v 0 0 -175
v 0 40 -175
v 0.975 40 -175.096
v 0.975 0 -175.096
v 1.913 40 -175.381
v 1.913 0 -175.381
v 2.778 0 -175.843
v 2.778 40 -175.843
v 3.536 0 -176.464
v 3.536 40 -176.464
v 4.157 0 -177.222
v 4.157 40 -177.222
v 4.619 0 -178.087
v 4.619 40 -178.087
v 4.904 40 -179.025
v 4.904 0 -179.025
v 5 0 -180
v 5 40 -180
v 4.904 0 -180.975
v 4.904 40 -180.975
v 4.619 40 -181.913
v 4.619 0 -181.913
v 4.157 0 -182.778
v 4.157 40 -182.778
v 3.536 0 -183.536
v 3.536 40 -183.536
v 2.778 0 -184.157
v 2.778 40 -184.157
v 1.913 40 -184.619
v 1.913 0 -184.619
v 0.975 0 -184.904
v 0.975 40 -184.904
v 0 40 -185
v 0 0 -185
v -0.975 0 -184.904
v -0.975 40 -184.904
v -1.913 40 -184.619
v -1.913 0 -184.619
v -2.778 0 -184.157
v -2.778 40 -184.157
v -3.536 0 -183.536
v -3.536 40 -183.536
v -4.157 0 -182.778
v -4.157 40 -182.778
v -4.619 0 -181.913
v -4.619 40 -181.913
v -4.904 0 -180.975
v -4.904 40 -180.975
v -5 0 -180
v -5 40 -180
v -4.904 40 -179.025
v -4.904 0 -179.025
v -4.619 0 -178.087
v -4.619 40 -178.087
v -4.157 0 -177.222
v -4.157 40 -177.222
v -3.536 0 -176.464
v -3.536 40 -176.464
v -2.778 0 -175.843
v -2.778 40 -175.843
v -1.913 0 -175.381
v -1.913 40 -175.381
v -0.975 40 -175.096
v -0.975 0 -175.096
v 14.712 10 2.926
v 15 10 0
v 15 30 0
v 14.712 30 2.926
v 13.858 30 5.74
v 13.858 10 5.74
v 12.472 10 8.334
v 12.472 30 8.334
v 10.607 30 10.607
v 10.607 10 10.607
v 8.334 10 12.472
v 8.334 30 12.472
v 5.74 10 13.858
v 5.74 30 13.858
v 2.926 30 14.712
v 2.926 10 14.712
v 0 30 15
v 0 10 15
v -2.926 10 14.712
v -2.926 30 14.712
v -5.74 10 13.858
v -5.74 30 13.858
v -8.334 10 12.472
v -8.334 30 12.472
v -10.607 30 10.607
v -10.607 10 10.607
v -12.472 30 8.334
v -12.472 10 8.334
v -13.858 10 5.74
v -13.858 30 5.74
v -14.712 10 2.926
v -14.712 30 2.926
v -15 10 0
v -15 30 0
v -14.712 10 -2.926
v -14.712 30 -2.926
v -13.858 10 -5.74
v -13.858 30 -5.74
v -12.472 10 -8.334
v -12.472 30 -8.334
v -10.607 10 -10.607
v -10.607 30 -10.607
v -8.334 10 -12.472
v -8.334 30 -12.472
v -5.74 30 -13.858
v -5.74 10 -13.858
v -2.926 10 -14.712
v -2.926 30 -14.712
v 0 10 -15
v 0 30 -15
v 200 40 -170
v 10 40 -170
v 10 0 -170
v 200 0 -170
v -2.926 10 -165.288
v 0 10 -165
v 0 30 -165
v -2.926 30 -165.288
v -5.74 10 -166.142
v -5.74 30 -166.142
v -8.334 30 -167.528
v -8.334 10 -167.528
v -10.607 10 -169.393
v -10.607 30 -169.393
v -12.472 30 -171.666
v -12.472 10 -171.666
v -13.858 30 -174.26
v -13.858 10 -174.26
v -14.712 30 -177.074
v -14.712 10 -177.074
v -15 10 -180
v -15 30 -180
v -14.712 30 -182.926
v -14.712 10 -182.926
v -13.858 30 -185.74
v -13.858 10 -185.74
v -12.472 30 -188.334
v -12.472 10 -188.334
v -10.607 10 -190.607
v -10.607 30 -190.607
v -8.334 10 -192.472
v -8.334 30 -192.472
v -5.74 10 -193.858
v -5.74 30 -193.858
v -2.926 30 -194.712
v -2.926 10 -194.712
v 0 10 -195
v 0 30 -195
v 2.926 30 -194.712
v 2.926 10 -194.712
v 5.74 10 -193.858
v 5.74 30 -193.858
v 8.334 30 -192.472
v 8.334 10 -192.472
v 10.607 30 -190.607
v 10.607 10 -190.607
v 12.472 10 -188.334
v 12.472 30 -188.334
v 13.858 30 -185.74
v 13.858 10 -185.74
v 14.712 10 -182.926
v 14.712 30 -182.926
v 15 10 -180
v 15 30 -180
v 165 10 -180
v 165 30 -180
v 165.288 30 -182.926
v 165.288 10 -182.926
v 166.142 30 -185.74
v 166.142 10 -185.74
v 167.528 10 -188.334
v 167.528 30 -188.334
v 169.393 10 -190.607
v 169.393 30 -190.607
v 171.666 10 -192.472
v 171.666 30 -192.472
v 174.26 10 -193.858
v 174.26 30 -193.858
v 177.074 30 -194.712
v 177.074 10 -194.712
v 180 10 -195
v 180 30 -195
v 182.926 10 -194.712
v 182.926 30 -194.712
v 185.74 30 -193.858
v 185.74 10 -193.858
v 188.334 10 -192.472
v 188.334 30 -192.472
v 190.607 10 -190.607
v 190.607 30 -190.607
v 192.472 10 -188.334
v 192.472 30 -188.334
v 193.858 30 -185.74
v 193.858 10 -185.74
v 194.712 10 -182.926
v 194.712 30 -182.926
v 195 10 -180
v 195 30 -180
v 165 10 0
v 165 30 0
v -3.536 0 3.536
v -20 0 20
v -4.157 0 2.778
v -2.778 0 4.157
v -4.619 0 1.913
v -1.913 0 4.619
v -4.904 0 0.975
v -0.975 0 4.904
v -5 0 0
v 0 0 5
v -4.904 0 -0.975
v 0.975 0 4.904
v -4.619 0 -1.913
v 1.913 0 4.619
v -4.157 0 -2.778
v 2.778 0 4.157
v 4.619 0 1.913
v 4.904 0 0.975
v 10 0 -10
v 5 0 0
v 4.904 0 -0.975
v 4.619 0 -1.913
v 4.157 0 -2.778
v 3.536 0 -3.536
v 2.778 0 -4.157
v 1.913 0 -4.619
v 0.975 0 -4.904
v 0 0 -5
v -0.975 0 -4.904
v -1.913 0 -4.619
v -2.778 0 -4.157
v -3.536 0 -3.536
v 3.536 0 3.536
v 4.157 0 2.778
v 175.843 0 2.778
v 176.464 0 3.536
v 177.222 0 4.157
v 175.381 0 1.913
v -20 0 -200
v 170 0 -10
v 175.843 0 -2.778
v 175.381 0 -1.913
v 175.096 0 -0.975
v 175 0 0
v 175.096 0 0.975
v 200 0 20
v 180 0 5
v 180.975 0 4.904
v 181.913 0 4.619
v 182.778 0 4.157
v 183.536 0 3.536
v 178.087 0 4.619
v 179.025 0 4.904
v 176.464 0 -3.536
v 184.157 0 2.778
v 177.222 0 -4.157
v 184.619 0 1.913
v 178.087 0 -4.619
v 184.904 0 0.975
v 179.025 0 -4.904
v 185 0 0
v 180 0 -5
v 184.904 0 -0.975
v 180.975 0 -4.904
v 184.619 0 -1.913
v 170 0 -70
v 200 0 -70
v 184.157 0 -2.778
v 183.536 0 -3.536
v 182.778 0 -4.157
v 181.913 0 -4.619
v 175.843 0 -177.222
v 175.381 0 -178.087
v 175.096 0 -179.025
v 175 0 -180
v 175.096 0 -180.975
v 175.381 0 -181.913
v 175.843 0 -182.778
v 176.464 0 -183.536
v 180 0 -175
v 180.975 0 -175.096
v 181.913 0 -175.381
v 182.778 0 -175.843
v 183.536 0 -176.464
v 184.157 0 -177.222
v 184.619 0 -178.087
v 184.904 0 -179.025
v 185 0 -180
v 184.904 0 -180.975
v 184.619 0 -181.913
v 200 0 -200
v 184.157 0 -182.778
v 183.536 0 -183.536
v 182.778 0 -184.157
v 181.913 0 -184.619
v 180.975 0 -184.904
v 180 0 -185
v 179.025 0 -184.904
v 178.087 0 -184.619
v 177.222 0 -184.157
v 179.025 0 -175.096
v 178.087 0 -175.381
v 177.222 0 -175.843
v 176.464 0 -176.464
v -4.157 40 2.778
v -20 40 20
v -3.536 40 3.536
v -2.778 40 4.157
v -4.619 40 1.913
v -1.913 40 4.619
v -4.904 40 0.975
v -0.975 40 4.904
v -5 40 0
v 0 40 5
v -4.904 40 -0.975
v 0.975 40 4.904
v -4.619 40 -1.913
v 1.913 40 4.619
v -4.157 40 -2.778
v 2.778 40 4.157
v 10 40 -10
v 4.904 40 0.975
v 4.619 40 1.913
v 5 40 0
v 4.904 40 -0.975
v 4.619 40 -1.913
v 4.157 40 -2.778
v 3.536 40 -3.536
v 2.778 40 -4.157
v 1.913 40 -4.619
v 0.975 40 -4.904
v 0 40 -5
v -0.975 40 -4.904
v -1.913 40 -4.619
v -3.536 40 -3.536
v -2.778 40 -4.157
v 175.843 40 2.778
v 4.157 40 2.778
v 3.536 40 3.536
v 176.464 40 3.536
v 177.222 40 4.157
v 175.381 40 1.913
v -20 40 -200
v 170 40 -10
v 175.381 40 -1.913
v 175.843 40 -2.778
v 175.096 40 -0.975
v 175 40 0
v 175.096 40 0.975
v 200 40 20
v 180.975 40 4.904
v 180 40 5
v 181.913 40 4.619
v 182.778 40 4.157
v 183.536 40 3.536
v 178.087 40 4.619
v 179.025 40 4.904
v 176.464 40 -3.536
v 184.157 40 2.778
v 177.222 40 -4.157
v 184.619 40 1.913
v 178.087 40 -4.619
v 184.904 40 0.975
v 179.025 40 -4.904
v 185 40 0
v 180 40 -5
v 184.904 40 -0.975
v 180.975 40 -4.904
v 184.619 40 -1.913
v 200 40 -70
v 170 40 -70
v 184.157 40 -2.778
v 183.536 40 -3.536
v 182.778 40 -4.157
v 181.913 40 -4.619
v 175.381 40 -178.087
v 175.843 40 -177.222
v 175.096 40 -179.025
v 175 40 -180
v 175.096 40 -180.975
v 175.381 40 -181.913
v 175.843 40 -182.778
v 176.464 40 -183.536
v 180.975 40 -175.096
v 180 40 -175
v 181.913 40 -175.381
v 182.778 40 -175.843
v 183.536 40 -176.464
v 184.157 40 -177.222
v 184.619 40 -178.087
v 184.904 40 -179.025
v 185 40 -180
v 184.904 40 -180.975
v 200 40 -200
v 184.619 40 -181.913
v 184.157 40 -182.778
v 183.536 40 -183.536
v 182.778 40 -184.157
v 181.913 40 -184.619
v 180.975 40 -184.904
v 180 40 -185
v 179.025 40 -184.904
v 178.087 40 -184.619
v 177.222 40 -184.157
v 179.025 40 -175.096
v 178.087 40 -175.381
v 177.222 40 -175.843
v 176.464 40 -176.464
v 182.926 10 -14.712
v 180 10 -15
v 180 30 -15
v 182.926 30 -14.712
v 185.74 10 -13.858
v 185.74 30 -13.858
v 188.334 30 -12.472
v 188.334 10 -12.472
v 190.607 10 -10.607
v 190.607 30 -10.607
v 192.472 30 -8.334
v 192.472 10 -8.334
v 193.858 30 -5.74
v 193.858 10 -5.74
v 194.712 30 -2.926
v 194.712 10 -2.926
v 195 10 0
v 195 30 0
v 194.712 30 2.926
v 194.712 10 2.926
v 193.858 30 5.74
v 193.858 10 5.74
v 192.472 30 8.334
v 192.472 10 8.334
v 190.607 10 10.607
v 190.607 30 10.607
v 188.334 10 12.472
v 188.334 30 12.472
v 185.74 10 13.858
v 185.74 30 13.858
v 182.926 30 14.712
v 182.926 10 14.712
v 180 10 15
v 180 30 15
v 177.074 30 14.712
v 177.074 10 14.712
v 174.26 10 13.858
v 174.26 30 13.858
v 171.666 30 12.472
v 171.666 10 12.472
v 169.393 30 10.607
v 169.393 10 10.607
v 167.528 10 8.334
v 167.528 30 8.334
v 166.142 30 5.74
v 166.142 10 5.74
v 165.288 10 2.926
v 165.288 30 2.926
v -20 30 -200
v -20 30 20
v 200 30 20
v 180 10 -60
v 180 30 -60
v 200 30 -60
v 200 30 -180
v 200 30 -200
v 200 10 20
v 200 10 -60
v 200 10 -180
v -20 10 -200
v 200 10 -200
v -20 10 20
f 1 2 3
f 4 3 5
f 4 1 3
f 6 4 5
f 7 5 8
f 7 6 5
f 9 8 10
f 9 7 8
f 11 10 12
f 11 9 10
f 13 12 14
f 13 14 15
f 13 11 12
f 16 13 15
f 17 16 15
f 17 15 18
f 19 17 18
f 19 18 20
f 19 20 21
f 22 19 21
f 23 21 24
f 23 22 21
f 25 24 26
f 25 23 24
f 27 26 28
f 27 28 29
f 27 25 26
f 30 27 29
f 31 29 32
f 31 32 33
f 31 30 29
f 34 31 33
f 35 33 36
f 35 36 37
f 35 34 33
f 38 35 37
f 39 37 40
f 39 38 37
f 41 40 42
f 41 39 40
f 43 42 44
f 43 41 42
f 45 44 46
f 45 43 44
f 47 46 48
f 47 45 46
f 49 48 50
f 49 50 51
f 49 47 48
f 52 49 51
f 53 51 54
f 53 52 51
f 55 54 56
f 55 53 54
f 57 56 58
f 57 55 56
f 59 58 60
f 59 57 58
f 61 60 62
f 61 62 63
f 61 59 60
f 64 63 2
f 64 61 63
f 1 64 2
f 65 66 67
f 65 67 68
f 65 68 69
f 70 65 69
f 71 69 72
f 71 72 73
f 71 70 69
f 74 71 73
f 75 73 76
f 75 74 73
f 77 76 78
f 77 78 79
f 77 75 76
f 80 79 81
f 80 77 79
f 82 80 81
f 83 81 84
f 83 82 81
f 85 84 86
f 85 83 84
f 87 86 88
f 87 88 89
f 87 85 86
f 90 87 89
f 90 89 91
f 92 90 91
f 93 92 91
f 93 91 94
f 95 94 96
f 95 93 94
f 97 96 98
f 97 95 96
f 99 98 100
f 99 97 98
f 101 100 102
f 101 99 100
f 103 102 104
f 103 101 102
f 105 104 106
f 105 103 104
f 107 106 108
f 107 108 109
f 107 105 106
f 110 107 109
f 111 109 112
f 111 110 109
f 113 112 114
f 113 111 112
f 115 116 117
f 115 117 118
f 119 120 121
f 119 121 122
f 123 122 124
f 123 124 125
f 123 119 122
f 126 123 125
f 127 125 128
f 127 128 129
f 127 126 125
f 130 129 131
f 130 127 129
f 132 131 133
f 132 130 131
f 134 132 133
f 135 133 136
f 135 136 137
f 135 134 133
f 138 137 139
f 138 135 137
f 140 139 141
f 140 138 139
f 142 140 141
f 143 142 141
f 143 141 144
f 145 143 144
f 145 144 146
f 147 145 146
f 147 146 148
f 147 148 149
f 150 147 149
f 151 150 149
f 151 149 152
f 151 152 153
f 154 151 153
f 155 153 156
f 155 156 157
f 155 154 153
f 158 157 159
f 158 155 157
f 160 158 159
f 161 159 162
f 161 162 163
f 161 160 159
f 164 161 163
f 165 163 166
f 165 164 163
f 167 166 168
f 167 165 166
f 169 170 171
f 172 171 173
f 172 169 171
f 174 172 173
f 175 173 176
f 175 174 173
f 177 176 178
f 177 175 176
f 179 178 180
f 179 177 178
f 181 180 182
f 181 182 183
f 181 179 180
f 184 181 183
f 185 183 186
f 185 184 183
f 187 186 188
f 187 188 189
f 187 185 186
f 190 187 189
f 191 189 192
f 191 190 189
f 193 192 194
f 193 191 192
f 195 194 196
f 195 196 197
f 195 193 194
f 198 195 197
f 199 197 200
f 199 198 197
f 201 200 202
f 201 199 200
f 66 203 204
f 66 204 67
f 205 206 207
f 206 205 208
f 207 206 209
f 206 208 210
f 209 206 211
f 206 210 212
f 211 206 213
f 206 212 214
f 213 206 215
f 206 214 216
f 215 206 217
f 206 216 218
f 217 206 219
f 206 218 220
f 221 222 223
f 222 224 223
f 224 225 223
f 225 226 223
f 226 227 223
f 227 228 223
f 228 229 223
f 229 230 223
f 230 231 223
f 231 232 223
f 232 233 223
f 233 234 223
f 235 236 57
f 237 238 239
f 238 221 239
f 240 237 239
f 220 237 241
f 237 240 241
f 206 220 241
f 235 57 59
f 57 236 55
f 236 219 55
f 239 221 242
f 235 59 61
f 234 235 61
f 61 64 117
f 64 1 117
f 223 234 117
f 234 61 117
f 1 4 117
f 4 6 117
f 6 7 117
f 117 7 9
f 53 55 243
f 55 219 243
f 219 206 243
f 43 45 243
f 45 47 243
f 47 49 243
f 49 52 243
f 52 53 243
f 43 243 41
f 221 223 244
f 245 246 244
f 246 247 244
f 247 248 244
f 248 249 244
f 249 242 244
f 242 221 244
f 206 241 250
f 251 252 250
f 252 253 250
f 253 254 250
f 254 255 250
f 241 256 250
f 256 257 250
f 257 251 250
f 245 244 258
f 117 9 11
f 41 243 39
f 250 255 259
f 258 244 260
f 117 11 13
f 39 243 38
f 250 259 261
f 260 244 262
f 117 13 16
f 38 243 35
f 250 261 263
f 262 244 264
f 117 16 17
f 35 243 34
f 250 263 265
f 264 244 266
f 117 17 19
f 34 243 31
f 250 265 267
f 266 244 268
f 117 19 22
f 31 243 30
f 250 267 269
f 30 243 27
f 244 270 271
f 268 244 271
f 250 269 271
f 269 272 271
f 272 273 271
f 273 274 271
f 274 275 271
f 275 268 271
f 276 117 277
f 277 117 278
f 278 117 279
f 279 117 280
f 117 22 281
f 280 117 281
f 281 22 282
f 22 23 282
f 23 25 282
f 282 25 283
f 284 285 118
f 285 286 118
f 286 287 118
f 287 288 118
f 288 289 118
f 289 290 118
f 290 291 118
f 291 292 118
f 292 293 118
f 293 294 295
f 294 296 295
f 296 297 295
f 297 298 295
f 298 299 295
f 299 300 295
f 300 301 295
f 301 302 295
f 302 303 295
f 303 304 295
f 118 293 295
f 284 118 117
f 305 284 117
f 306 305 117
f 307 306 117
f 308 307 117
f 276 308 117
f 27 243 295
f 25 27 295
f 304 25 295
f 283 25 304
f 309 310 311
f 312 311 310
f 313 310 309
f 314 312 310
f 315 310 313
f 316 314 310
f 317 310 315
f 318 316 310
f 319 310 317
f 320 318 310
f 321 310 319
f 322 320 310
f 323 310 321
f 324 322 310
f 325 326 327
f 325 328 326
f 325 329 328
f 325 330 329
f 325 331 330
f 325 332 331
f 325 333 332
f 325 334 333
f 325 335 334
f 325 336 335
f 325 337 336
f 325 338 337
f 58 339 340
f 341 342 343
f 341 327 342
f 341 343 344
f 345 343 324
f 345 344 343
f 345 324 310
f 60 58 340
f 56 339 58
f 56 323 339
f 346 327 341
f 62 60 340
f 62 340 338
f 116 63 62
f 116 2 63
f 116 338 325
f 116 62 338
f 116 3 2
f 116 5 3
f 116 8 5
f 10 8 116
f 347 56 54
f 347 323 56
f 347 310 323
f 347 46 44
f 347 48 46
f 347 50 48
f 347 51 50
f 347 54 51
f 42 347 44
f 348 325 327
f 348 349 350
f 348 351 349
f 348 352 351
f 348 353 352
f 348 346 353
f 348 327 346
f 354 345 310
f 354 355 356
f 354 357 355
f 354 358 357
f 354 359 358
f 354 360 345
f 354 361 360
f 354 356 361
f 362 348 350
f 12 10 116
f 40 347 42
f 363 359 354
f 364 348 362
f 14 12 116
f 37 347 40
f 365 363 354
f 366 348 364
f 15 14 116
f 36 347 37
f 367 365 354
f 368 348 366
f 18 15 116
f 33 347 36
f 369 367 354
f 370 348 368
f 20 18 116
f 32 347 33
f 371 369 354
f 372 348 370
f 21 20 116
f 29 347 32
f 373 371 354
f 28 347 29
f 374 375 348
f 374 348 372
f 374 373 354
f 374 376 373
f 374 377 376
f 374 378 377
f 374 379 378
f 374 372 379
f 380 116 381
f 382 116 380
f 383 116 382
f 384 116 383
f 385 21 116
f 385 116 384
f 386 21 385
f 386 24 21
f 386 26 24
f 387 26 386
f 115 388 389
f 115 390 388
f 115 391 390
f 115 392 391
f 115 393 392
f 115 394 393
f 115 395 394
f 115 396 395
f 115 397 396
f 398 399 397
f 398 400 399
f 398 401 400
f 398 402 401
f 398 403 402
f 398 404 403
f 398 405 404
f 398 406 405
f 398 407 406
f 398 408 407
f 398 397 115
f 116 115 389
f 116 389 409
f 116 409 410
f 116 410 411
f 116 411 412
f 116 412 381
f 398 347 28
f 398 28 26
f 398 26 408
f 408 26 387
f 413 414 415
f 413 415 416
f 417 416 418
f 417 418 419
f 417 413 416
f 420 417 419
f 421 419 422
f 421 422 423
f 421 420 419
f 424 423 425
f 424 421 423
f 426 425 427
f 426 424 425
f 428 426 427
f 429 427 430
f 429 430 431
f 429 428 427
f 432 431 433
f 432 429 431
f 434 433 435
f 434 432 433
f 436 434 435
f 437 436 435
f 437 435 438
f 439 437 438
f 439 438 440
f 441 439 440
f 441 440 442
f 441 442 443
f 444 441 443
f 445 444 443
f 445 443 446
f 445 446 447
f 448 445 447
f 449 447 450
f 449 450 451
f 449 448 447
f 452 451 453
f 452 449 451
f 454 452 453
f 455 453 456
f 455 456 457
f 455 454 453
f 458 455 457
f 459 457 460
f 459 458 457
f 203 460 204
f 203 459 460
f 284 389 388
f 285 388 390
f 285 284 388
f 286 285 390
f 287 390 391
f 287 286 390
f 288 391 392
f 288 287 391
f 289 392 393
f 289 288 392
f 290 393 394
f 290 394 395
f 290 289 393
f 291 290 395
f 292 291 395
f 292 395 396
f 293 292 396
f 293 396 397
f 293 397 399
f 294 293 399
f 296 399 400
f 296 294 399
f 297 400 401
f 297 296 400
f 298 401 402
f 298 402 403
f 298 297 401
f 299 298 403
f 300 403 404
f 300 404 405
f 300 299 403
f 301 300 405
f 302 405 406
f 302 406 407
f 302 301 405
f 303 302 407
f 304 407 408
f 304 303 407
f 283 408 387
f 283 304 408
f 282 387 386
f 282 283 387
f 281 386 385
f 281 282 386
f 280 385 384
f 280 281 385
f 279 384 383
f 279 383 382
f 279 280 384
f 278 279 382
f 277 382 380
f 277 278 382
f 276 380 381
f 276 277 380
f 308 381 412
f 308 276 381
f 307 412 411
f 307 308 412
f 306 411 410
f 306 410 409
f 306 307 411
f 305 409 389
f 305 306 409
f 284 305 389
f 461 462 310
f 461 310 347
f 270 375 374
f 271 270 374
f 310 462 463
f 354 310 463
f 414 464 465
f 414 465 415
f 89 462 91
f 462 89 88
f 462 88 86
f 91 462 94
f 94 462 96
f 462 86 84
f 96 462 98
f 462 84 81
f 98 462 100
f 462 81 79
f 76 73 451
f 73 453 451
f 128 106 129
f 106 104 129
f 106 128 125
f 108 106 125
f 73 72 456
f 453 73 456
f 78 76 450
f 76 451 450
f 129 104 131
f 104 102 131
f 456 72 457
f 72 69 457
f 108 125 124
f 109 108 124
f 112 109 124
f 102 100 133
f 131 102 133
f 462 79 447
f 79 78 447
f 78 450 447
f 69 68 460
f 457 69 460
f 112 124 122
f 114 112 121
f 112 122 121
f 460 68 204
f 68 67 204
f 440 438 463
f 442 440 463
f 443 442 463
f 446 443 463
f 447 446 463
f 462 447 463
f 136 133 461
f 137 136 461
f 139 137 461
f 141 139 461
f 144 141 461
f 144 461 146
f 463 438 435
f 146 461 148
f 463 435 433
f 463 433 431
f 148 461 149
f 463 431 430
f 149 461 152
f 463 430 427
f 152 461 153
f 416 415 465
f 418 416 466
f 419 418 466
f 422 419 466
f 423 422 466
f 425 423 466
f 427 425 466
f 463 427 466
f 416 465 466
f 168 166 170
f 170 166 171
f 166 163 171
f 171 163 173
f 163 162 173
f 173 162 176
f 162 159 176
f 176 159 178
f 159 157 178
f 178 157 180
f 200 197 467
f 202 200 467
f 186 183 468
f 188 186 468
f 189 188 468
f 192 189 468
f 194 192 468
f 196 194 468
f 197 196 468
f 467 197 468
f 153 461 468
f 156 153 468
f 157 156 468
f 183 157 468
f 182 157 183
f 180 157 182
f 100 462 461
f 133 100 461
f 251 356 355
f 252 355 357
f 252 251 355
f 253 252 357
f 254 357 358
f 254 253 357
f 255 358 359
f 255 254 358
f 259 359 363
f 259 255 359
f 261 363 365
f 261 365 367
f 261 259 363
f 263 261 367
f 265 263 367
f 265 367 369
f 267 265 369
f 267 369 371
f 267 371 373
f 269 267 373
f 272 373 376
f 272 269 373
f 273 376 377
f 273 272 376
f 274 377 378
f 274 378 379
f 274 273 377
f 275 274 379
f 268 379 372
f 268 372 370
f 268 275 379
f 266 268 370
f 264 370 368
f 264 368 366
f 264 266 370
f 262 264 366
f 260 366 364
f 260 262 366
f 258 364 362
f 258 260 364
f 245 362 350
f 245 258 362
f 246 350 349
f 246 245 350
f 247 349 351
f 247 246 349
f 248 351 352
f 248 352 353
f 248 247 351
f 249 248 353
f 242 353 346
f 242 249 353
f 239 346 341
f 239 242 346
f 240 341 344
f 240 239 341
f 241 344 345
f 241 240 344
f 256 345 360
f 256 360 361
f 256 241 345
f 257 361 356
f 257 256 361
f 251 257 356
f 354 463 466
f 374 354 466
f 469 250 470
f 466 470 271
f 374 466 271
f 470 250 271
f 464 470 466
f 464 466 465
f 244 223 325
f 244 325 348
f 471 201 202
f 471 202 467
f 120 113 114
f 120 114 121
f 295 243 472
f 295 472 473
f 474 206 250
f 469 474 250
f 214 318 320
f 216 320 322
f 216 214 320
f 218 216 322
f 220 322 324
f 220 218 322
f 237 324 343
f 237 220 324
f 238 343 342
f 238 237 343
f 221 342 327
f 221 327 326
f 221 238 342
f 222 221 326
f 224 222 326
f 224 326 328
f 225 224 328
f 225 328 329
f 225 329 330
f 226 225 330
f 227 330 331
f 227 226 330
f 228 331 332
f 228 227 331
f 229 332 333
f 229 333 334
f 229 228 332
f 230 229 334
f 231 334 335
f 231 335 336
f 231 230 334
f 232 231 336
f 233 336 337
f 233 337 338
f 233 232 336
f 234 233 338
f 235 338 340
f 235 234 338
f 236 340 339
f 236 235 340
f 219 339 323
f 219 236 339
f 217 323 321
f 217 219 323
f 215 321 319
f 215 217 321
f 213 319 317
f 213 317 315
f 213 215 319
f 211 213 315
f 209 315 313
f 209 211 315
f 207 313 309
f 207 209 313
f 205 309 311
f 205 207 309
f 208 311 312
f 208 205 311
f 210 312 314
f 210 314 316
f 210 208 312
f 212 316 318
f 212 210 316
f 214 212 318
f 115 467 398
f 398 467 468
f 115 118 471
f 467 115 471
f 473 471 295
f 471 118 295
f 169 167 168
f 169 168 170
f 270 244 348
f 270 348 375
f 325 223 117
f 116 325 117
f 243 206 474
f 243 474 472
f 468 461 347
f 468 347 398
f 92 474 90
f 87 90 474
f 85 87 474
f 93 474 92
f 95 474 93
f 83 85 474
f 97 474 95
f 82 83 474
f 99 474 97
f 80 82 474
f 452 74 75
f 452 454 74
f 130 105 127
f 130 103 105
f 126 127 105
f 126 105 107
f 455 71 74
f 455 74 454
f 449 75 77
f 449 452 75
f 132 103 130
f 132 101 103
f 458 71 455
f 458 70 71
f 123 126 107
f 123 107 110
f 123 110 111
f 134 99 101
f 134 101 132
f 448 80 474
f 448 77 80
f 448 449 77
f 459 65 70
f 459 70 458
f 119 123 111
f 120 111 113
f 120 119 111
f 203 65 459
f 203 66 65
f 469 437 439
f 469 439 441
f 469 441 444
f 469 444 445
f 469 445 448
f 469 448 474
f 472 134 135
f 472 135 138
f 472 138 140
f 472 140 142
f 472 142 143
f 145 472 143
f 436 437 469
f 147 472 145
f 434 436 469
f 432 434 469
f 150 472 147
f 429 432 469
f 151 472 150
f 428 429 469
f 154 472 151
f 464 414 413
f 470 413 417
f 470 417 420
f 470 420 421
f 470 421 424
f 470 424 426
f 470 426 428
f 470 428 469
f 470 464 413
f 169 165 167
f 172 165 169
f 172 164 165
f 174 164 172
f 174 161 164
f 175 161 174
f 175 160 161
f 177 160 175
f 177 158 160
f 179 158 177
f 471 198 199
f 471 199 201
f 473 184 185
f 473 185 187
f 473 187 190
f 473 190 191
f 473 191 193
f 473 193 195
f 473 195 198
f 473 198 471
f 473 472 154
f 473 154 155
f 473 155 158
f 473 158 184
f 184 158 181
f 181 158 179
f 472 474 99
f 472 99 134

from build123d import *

# Parameters (mm, degrees)
SKETCH1_W           = 220
SKETCH1_H           = 220
SKETCH1_R           = 5
SKETCH1_W_2         = 160
SKETCH1_H_2         = 160
BOSS_EXTRUDE1_DEPTH = 40
SKETCH4_W           = 30
SKETCH4_H           = 100
CUT_EXTRUDE1_DEPTH  = 286.657137142
SHELL1_START        = 10
SHELL1_DEPTH        = 20


# Read off the part's stored shape, not the designer's step: Shell1
with BuildPart() as part:
    # Sketch1 → Boss-Extrude1 (new body)
    with BuildSketch(Plane(origin=(0, 0, 0), x_dir=(1, 0, 0), z_dir=(0, 1, 0))):
        with Locations((90, 90)):
            Rectangle(SKETCH1_W, SKETCH1_H)
        with Locations(Location((0, 180, 0), (0, 0, 270))):
            Circle(SKETCH1_R, mode=Mode.SUBTRACT)
        with Locations(Location((180, 180, 0), (0, 0, 270))):
            Circle(SKETCH1_R, mode=Mode.SUBTRACT)
        with Locations(Location((180, 0, 0), (0, 0, 270))):
            Circle(SKETCH1_R, mode=Mode.SUBTRACT)
        with Locations(Location((0, 0, 0), (0, 0, 270))):
            Circle(SKETCH1_R, mode=Mode.SUBTRACT)
        with Locations((90, 90)):
            Rectangle(SKETCH1_W_2, SKETCH1_H_2, mode=Mode.SUBTRACT)
    extrude(amount=BOSS_EXTRUDE1_DEPTH)

    # Sketch4 → Cut-Extrude1 (cut, through all)
    with BuildSketch(Plane(origin=(0, 40, 0), x_dir=(1, 0, 0), z_dir=(0, 1, 0))):
        with Locations((185, 120)):
            Rectangle(SKETCH4_W, SKETCH4_H)
    extrude(amount=-CUT_EXTRUDE1_DEPTH, mode=Mode.SUBTRACT)

    # Shell1 outline → Shell1 (cut)
    with BuildSketch(Plane(origin=(0, 0, 0), x_dir=(1, 0, 0), z_dir=(0, 1, 0)).offset(SHELL1_START)):
        with BuildLine():
            Line((15, 180), (165, 180))
            ThreePointArc((165, 180), (180, 195), (195, 180))
            Line((195, 180), (200, 180))
            Line((200, 180), (200, 200))
            Line((200, 200), (-20, 200))
            Line((-20, 200), (-20, -20))
            Line((-20, -20), (200, -20))
            Line((200, -20), (200, 60))
            Line((200, 60), (180, 60))
            Line((180, 60), (180, 15))
            ThreePointArc((180, 15), (190.606601718, -10.606601718), (165, 0))
            Line((165, 0), (15, 0))
            ThreePointArc((15, 0), (-10.606601718, -10.606601718), (0, 15))
            Line((0, 15), (0, 165))
            ThreePointArc((0, 165), (-10.606601718, 190.606601718), (15, 180))
        make_face()
    extrude(amount=SHELL1_DEPTH, mode=Mode.SUBTRACT)


solid = part.part
